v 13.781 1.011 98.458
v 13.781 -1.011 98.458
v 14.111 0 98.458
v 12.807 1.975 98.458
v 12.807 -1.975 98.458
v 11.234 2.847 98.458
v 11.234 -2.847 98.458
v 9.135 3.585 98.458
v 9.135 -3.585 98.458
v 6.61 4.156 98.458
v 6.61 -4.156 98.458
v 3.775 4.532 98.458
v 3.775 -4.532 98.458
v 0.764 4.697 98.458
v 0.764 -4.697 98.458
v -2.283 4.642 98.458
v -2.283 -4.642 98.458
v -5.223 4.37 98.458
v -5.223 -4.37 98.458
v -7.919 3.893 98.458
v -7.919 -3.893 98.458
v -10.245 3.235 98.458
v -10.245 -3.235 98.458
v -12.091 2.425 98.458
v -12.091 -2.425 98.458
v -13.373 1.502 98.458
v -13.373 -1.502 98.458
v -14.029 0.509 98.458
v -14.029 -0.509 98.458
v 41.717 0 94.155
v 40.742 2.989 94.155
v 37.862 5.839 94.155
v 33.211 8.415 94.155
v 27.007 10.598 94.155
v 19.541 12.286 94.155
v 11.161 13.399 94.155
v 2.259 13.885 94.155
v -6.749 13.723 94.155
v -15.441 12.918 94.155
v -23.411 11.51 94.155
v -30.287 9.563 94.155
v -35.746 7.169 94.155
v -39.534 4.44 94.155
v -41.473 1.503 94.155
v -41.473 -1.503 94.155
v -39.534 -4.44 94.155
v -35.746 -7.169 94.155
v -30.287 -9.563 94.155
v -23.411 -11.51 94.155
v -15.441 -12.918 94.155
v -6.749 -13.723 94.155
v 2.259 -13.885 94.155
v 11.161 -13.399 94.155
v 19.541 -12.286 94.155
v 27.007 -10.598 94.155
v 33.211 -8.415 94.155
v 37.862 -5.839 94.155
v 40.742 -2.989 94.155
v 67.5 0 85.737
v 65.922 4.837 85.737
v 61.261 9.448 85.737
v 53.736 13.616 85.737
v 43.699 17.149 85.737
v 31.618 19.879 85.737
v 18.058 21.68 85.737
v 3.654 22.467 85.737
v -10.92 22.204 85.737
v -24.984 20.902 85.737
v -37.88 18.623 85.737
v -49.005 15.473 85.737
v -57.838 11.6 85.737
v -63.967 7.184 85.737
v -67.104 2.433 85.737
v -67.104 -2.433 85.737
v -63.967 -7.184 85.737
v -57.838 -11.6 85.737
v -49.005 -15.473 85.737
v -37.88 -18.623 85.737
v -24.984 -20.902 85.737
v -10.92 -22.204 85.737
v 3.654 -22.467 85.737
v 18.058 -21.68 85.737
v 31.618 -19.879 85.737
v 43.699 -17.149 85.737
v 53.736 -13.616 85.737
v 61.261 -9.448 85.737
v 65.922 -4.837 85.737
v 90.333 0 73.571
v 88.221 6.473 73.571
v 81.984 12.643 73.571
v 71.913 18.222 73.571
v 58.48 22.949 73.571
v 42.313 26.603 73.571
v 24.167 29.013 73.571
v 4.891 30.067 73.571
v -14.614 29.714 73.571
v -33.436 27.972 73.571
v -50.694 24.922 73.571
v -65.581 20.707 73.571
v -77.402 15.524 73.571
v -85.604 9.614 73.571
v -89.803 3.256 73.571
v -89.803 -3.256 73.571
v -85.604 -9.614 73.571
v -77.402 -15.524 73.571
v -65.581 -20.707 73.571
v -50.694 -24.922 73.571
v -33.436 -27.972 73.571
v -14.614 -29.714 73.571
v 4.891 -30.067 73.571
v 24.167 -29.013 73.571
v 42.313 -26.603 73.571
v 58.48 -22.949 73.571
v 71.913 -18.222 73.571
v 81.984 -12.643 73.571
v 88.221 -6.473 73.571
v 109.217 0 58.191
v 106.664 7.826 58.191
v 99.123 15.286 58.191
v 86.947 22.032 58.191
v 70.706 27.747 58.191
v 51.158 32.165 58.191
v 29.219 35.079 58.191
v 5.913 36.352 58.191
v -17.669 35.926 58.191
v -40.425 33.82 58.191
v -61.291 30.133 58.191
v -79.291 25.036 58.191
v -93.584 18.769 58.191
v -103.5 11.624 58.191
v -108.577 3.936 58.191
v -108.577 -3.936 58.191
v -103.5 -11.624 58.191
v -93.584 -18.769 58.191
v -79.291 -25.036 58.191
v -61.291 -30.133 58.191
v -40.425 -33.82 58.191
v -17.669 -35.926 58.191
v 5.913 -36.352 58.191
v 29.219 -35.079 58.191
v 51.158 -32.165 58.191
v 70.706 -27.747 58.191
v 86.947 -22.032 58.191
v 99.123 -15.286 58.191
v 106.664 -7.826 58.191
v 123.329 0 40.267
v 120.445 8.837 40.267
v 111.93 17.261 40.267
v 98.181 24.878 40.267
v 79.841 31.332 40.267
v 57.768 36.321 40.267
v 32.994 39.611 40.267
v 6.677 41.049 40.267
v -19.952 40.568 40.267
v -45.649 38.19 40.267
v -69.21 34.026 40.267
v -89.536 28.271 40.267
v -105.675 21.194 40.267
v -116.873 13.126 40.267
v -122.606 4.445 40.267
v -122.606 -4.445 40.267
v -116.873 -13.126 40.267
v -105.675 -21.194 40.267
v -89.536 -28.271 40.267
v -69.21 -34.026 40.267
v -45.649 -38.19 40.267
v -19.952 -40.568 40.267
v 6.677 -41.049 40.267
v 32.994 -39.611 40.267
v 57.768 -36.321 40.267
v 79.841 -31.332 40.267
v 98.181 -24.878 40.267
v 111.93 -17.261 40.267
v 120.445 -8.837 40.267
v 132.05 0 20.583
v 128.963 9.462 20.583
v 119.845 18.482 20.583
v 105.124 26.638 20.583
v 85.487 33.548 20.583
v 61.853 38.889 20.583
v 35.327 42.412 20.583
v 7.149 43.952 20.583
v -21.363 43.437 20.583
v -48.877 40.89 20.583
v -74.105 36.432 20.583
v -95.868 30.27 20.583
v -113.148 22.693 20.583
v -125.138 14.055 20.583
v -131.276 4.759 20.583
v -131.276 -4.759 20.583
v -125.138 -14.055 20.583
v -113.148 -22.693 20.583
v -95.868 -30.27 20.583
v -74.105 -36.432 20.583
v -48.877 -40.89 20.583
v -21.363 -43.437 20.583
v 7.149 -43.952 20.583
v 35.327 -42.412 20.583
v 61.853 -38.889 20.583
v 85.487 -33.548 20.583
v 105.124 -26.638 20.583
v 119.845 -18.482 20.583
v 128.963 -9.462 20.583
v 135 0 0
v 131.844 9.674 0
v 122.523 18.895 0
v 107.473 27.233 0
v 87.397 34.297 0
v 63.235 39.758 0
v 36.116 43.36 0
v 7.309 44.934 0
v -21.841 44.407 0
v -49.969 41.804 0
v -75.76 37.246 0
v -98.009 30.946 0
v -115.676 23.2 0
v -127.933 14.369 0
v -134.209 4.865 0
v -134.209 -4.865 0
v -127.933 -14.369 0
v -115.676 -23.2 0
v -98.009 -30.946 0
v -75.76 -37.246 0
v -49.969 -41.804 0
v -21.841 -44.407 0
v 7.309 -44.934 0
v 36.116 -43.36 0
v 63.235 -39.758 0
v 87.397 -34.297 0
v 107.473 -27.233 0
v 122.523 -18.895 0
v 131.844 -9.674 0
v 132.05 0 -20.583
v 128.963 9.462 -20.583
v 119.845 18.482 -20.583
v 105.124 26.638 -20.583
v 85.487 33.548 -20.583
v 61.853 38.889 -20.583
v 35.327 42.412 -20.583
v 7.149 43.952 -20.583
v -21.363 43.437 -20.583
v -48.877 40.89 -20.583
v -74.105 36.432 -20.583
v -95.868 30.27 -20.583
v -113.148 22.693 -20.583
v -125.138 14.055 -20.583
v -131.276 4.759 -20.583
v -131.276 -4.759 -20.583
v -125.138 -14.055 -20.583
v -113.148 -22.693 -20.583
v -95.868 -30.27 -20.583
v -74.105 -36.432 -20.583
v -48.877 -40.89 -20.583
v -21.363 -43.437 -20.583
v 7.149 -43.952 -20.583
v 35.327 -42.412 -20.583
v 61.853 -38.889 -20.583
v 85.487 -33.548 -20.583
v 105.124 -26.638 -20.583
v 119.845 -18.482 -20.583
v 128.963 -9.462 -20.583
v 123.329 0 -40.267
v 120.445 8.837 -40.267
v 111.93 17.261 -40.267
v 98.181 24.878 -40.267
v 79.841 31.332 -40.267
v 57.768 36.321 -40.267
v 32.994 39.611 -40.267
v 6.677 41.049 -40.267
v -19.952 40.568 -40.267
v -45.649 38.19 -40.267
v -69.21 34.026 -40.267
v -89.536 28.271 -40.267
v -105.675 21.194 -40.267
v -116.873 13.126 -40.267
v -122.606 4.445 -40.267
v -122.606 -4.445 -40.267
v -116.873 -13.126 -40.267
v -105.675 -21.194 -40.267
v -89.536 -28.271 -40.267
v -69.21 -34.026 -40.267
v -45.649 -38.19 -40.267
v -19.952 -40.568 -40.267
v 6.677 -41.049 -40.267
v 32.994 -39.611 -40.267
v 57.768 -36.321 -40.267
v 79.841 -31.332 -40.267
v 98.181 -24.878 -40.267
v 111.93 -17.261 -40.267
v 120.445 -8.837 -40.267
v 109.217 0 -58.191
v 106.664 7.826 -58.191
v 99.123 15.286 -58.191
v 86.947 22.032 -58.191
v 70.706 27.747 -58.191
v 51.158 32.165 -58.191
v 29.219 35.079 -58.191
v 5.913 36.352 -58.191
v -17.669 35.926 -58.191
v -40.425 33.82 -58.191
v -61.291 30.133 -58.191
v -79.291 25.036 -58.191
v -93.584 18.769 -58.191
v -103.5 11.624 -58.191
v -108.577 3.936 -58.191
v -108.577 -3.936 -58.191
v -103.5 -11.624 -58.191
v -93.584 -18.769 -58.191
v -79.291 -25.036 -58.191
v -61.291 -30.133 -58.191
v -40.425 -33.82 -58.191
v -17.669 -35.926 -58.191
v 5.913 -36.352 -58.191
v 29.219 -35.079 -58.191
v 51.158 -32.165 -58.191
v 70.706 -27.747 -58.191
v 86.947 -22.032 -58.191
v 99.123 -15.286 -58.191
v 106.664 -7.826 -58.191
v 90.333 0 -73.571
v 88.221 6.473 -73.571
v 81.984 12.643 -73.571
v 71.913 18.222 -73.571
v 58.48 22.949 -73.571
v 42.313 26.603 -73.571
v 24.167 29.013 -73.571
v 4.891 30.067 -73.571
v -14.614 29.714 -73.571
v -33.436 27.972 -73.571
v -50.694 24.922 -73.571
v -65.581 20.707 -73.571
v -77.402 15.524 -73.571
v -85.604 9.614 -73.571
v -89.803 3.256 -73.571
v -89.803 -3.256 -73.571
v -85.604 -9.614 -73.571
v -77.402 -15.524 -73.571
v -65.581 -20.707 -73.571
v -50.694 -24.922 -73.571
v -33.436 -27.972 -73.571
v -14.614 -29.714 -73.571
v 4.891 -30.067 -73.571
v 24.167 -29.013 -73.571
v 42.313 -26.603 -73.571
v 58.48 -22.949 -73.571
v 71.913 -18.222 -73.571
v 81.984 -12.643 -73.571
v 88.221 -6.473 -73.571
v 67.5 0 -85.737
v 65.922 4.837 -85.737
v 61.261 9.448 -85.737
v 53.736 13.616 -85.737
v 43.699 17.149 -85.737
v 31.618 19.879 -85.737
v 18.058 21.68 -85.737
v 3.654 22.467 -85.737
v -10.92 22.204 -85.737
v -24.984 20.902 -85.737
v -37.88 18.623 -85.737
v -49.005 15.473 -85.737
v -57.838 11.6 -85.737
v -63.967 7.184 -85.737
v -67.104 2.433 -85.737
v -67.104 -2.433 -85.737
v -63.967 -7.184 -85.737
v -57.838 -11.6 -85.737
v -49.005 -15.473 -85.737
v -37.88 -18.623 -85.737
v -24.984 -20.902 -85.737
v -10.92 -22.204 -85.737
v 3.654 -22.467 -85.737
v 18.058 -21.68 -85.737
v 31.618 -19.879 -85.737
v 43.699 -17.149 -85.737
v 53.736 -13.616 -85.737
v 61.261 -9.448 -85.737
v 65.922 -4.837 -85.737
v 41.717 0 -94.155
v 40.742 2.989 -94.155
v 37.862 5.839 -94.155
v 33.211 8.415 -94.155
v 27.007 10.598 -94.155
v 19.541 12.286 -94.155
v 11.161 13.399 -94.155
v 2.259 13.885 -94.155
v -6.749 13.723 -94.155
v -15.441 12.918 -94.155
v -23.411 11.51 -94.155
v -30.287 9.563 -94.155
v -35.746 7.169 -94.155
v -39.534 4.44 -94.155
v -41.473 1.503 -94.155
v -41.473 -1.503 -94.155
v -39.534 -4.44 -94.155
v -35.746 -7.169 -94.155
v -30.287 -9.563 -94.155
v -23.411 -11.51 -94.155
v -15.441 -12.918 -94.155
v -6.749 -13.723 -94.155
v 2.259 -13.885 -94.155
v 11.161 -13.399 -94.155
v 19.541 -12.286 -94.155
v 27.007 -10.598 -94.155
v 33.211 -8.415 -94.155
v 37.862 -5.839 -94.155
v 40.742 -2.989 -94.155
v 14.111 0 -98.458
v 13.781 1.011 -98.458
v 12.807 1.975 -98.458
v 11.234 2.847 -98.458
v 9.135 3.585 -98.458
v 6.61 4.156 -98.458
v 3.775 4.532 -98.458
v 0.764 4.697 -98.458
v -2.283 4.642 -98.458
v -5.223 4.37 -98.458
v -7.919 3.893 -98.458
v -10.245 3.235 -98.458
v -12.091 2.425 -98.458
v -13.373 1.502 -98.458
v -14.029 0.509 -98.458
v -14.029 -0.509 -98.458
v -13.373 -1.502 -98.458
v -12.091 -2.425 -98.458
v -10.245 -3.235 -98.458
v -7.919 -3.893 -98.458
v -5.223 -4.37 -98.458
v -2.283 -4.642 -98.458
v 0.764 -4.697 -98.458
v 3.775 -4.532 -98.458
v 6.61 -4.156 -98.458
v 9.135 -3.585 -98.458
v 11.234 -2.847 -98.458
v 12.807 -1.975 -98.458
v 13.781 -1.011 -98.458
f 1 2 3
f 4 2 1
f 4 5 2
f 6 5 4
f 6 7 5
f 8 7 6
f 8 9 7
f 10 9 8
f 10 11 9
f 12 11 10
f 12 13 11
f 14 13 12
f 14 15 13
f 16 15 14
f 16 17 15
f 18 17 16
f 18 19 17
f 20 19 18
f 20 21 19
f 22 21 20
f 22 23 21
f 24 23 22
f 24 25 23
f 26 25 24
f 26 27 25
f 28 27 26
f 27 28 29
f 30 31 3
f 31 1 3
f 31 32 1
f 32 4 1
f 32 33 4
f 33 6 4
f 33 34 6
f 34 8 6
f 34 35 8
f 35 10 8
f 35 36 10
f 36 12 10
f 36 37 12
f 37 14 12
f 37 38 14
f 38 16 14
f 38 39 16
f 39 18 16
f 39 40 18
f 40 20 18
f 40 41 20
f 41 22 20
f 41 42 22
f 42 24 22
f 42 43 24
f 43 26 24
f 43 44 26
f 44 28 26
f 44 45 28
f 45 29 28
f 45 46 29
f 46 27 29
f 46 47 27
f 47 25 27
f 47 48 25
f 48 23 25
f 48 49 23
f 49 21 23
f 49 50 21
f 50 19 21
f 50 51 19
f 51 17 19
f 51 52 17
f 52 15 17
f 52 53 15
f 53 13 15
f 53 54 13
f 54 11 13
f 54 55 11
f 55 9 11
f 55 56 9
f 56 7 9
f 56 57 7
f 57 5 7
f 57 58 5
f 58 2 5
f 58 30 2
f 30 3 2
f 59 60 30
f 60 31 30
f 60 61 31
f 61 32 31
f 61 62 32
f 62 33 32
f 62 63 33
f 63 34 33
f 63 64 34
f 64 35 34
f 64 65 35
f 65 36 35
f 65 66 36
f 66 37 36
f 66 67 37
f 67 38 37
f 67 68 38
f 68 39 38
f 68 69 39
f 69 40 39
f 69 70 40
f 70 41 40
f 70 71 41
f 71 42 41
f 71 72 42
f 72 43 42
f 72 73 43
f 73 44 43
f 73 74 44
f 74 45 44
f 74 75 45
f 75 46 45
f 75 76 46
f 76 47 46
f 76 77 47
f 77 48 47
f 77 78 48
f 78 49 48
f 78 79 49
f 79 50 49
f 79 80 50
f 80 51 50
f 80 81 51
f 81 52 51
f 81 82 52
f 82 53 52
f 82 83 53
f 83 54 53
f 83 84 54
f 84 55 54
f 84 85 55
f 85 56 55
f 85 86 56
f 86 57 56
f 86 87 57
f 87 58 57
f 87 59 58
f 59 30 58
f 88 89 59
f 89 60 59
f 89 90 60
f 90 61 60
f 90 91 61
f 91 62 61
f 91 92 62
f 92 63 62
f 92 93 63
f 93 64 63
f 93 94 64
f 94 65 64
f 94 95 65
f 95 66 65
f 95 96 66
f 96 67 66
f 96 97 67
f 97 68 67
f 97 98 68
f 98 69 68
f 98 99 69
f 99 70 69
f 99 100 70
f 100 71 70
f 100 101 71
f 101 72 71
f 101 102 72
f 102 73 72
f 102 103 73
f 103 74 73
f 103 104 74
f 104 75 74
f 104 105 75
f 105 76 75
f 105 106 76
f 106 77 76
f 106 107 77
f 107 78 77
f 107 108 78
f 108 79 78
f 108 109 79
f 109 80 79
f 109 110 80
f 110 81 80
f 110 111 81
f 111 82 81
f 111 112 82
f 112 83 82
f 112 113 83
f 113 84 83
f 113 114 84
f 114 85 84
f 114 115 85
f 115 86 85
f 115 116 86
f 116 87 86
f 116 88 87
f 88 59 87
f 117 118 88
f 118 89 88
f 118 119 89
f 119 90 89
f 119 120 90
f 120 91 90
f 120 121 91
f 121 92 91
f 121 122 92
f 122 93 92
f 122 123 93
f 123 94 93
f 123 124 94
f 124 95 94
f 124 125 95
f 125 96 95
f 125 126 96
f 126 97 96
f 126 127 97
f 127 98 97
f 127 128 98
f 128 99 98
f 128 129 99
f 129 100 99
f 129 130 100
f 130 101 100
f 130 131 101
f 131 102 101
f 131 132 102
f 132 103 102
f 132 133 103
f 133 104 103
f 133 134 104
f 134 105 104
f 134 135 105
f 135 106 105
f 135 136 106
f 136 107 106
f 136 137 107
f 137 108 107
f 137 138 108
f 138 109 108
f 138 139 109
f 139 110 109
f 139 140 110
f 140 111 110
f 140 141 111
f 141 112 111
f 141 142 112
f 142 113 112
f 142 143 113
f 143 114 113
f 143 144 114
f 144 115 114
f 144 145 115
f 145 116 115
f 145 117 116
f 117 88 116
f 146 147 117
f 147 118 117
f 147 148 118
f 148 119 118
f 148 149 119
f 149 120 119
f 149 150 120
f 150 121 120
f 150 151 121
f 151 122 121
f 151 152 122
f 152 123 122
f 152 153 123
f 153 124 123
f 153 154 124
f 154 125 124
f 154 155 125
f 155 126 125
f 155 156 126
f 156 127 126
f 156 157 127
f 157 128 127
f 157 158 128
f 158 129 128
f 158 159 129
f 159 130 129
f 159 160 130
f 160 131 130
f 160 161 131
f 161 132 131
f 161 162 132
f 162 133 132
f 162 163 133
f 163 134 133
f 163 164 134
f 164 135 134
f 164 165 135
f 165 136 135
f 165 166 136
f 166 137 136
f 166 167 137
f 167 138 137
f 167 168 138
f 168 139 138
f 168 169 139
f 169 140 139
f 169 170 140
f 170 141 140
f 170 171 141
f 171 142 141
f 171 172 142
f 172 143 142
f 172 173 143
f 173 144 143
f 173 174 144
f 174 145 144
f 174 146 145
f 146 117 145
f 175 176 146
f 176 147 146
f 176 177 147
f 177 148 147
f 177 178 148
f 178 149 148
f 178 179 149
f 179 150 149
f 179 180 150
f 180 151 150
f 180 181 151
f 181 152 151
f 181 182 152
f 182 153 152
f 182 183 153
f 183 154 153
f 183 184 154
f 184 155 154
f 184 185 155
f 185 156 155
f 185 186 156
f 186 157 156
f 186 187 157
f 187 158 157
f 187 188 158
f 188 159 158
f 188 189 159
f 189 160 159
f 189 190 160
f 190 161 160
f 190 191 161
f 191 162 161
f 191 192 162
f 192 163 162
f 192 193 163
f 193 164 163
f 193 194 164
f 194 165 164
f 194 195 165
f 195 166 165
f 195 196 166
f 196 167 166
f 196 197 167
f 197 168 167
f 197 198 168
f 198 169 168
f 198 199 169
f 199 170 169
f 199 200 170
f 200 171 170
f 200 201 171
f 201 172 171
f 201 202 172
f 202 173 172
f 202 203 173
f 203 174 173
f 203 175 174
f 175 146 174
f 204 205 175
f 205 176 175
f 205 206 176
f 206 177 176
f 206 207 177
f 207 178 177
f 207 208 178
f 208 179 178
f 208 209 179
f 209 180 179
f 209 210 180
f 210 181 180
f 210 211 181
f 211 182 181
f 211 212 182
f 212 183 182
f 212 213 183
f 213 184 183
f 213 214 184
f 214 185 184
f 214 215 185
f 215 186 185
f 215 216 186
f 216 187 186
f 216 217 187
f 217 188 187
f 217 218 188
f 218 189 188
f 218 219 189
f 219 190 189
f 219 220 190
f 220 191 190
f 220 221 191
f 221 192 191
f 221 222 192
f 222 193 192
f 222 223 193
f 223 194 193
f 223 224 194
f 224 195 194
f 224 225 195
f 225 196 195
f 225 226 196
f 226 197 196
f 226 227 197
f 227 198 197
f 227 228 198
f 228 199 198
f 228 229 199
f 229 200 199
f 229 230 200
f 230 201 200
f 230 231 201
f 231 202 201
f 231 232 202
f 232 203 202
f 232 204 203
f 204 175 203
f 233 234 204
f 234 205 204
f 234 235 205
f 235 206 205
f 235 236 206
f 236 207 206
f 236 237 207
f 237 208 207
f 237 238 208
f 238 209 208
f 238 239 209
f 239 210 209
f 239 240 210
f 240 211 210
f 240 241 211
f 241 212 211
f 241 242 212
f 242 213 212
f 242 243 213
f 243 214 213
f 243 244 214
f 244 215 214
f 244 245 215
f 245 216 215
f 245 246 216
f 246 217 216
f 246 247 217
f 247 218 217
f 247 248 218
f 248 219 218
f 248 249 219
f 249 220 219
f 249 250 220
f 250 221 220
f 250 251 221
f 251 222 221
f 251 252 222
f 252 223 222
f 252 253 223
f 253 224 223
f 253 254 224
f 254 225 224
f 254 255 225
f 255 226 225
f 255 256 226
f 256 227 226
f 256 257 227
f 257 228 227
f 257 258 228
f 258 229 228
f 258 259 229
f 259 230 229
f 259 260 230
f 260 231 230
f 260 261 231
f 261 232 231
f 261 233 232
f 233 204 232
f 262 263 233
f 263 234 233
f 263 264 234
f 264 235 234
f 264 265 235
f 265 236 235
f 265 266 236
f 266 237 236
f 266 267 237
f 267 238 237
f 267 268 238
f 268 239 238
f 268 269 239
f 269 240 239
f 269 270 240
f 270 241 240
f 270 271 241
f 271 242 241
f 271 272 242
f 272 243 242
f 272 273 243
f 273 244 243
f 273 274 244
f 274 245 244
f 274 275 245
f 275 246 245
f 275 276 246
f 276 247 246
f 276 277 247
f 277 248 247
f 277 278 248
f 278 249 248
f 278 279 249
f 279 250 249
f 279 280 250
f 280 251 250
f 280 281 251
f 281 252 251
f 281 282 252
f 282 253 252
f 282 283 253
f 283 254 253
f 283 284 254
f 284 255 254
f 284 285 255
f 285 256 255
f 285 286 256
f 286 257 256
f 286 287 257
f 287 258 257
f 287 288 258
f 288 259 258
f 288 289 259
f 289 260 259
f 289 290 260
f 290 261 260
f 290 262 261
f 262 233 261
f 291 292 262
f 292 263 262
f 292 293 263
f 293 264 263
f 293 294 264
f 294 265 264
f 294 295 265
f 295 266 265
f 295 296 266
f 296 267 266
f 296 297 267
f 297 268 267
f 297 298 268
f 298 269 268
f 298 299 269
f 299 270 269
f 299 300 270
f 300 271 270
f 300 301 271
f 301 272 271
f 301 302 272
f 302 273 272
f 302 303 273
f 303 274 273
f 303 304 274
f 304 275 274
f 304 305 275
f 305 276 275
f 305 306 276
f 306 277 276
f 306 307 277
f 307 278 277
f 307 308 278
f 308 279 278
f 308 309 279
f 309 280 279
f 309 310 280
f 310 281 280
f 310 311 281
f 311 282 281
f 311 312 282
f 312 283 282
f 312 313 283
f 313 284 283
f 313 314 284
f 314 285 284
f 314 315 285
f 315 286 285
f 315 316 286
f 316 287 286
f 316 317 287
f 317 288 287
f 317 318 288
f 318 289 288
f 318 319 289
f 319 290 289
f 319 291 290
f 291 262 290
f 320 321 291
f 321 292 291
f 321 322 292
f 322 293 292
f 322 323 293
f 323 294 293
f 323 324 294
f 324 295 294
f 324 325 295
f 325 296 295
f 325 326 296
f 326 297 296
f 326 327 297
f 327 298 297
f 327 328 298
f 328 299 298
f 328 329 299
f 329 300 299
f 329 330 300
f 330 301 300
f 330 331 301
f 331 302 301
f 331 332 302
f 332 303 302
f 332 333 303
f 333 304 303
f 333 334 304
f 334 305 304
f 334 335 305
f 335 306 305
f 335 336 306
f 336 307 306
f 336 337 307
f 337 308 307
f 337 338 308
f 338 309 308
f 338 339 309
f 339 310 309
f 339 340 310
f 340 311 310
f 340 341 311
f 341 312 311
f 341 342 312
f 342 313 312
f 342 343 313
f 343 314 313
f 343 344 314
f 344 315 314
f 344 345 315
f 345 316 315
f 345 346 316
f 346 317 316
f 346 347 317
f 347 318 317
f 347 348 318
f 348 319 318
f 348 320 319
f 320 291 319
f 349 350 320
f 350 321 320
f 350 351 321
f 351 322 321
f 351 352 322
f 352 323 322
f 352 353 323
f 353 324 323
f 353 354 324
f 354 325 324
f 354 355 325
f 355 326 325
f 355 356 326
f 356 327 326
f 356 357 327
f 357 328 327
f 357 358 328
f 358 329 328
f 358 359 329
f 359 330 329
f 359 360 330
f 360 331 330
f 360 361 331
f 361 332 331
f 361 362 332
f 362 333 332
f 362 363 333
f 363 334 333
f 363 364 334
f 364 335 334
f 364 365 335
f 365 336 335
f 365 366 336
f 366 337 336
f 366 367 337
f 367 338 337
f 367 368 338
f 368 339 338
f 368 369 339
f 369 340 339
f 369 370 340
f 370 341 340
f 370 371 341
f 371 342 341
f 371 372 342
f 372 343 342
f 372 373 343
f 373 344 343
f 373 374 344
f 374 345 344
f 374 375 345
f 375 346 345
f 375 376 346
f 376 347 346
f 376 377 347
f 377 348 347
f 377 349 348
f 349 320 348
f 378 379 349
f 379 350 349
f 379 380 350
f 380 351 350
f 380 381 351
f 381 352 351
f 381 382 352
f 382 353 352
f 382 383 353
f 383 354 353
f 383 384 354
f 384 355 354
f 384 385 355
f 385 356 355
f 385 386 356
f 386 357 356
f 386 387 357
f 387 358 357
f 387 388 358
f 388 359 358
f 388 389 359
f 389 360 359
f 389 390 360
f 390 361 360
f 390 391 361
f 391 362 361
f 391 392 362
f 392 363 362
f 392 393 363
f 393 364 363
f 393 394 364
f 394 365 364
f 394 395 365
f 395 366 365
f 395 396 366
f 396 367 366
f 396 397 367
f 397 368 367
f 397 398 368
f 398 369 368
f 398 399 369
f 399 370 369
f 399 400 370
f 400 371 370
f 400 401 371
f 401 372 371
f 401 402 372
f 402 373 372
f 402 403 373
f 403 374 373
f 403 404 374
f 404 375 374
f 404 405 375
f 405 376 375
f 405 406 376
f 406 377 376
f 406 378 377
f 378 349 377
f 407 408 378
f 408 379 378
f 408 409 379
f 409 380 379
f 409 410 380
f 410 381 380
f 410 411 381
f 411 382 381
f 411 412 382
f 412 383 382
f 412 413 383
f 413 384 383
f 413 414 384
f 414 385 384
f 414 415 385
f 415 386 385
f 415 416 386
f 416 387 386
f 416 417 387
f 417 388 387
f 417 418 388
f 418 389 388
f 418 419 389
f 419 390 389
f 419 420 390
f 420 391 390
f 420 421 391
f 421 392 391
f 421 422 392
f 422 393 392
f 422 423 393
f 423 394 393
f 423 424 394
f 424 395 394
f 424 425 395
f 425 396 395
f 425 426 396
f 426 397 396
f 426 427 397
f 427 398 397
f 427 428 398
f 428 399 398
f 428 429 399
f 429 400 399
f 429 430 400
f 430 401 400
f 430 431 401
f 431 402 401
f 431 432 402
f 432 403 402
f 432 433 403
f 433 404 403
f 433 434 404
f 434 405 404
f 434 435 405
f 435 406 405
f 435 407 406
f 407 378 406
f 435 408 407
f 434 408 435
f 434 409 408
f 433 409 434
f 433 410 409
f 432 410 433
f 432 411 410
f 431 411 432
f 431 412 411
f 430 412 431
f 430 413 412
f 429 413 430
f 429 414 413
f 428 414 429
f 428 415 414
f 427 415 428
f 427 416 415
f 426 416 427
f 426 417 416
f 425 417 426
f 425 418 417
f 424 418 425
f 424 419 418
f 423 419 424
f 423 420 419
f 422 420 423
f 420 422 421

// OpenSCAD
// Generated by SolidPython 1.0.1 on 2020-07-29 00:46:51


scale(v = [15, 5, 11]) {
	sphere(r = 9);
}
/***********************************************
*********      SolidPython code:      **********
************************************************
 
# import packages: SolidPython
from solid import *
from solid.utils import *
from itertools import chain, combinations, permutations


class Resize:

    def __init__(self, scad_file):
        self.scad_file = scad_file
        #self.scad_file = import_scad(scad_file)
        # cone/cylinder param:
        self.r1 = 0
        self.r2 = 0
        self.h = 0
        # rectangular prism param:
        self.w = 0
        self.l = 0
        # ellipse param:
        self.r = 0

    # import OpenScad code (file name corresponds to shape)


    # classify shape + parameters
    def assign(self, param1, param2, param3):
        if self.scad_file == 'cone.scad':
            self.r1 = param1
            self.r2 = param2
            self.h = param3
        elif self.scad_file == 'cylinder.scad':
            self.r1 = param1
            self.r2 = param2
            self.h = param3
        elif self.scad_file == 'rectangularPrism.scad':
            self.h = param1
            self.l = param2
            self.w = param3
        else:
            self.r = param1
            self.h = param2

    # resize parameters
    def iterate(self):
        x = range(3, 20, 2)
        i = 1
        if self.scad_file == 'cone.scad':
            tempList = list(permutations(x, 2))
            for temp in tempList:
                param1 = temp[0]
                param2 = temp[1]
                filepath = 'produced_scad_files/' + 'cone' + str(param1) + '_' + str(param2) + '_' + '.scad'
                scad_render_to_file(cylinder(h=param1, r1=param2, r2=0), filepath)

        elif self.scad_file == 'cylinder.scad':
            tempList = list(permutations(x, 3))
            for temp in tempList:
                param1 = temp[0]
                param2 = temp[1]
                filepath = 'produced_scad_files/' + 'cylinder' + str(param1) + '_' + str(param2) + '_' + '.scad'
                scad_render_to_file(cylinder(h=param1, r1=param2, r2=param2), filepath)

        elif self.scad_file == 'rectangularPrism.scad':
            tempList = list(permutations(x, 3))
            for temp in tempList:
                param1 = temp[0]
                param2 = temp[1]
                param3 = temp[2]
                filepath = 'produced_scad_files/' + 'rectangularPrism' + str(param1) + '_' + str(param2) + '_' + str(
                    param3) + '.scad'
                scad_render_to_file(cube(size=(param1, param2, param3)), filepath)

        elif self.scad_file == 'ellipse.scad':
            tempList = list(permutations(x, 4))
            for temp in tempList:
                param1 = temp[0]
                param2 = temp[1]
                param3 = temp[2]
                param4 = temp[3]
                filepath = 'produced_scad_files/' + 'ellipse' + str(param1) + '_' + str(param2) + '_' + str(param3) + '_' + str(param4) + '.scad'
                scad_render_to_file(scale([param1, param2, param3])(sphere(r=param4)), filepath)

    def render_to_scadfile(self):
        scad_render_to_file(scad, 'example.scad') 
 
************************************************/
